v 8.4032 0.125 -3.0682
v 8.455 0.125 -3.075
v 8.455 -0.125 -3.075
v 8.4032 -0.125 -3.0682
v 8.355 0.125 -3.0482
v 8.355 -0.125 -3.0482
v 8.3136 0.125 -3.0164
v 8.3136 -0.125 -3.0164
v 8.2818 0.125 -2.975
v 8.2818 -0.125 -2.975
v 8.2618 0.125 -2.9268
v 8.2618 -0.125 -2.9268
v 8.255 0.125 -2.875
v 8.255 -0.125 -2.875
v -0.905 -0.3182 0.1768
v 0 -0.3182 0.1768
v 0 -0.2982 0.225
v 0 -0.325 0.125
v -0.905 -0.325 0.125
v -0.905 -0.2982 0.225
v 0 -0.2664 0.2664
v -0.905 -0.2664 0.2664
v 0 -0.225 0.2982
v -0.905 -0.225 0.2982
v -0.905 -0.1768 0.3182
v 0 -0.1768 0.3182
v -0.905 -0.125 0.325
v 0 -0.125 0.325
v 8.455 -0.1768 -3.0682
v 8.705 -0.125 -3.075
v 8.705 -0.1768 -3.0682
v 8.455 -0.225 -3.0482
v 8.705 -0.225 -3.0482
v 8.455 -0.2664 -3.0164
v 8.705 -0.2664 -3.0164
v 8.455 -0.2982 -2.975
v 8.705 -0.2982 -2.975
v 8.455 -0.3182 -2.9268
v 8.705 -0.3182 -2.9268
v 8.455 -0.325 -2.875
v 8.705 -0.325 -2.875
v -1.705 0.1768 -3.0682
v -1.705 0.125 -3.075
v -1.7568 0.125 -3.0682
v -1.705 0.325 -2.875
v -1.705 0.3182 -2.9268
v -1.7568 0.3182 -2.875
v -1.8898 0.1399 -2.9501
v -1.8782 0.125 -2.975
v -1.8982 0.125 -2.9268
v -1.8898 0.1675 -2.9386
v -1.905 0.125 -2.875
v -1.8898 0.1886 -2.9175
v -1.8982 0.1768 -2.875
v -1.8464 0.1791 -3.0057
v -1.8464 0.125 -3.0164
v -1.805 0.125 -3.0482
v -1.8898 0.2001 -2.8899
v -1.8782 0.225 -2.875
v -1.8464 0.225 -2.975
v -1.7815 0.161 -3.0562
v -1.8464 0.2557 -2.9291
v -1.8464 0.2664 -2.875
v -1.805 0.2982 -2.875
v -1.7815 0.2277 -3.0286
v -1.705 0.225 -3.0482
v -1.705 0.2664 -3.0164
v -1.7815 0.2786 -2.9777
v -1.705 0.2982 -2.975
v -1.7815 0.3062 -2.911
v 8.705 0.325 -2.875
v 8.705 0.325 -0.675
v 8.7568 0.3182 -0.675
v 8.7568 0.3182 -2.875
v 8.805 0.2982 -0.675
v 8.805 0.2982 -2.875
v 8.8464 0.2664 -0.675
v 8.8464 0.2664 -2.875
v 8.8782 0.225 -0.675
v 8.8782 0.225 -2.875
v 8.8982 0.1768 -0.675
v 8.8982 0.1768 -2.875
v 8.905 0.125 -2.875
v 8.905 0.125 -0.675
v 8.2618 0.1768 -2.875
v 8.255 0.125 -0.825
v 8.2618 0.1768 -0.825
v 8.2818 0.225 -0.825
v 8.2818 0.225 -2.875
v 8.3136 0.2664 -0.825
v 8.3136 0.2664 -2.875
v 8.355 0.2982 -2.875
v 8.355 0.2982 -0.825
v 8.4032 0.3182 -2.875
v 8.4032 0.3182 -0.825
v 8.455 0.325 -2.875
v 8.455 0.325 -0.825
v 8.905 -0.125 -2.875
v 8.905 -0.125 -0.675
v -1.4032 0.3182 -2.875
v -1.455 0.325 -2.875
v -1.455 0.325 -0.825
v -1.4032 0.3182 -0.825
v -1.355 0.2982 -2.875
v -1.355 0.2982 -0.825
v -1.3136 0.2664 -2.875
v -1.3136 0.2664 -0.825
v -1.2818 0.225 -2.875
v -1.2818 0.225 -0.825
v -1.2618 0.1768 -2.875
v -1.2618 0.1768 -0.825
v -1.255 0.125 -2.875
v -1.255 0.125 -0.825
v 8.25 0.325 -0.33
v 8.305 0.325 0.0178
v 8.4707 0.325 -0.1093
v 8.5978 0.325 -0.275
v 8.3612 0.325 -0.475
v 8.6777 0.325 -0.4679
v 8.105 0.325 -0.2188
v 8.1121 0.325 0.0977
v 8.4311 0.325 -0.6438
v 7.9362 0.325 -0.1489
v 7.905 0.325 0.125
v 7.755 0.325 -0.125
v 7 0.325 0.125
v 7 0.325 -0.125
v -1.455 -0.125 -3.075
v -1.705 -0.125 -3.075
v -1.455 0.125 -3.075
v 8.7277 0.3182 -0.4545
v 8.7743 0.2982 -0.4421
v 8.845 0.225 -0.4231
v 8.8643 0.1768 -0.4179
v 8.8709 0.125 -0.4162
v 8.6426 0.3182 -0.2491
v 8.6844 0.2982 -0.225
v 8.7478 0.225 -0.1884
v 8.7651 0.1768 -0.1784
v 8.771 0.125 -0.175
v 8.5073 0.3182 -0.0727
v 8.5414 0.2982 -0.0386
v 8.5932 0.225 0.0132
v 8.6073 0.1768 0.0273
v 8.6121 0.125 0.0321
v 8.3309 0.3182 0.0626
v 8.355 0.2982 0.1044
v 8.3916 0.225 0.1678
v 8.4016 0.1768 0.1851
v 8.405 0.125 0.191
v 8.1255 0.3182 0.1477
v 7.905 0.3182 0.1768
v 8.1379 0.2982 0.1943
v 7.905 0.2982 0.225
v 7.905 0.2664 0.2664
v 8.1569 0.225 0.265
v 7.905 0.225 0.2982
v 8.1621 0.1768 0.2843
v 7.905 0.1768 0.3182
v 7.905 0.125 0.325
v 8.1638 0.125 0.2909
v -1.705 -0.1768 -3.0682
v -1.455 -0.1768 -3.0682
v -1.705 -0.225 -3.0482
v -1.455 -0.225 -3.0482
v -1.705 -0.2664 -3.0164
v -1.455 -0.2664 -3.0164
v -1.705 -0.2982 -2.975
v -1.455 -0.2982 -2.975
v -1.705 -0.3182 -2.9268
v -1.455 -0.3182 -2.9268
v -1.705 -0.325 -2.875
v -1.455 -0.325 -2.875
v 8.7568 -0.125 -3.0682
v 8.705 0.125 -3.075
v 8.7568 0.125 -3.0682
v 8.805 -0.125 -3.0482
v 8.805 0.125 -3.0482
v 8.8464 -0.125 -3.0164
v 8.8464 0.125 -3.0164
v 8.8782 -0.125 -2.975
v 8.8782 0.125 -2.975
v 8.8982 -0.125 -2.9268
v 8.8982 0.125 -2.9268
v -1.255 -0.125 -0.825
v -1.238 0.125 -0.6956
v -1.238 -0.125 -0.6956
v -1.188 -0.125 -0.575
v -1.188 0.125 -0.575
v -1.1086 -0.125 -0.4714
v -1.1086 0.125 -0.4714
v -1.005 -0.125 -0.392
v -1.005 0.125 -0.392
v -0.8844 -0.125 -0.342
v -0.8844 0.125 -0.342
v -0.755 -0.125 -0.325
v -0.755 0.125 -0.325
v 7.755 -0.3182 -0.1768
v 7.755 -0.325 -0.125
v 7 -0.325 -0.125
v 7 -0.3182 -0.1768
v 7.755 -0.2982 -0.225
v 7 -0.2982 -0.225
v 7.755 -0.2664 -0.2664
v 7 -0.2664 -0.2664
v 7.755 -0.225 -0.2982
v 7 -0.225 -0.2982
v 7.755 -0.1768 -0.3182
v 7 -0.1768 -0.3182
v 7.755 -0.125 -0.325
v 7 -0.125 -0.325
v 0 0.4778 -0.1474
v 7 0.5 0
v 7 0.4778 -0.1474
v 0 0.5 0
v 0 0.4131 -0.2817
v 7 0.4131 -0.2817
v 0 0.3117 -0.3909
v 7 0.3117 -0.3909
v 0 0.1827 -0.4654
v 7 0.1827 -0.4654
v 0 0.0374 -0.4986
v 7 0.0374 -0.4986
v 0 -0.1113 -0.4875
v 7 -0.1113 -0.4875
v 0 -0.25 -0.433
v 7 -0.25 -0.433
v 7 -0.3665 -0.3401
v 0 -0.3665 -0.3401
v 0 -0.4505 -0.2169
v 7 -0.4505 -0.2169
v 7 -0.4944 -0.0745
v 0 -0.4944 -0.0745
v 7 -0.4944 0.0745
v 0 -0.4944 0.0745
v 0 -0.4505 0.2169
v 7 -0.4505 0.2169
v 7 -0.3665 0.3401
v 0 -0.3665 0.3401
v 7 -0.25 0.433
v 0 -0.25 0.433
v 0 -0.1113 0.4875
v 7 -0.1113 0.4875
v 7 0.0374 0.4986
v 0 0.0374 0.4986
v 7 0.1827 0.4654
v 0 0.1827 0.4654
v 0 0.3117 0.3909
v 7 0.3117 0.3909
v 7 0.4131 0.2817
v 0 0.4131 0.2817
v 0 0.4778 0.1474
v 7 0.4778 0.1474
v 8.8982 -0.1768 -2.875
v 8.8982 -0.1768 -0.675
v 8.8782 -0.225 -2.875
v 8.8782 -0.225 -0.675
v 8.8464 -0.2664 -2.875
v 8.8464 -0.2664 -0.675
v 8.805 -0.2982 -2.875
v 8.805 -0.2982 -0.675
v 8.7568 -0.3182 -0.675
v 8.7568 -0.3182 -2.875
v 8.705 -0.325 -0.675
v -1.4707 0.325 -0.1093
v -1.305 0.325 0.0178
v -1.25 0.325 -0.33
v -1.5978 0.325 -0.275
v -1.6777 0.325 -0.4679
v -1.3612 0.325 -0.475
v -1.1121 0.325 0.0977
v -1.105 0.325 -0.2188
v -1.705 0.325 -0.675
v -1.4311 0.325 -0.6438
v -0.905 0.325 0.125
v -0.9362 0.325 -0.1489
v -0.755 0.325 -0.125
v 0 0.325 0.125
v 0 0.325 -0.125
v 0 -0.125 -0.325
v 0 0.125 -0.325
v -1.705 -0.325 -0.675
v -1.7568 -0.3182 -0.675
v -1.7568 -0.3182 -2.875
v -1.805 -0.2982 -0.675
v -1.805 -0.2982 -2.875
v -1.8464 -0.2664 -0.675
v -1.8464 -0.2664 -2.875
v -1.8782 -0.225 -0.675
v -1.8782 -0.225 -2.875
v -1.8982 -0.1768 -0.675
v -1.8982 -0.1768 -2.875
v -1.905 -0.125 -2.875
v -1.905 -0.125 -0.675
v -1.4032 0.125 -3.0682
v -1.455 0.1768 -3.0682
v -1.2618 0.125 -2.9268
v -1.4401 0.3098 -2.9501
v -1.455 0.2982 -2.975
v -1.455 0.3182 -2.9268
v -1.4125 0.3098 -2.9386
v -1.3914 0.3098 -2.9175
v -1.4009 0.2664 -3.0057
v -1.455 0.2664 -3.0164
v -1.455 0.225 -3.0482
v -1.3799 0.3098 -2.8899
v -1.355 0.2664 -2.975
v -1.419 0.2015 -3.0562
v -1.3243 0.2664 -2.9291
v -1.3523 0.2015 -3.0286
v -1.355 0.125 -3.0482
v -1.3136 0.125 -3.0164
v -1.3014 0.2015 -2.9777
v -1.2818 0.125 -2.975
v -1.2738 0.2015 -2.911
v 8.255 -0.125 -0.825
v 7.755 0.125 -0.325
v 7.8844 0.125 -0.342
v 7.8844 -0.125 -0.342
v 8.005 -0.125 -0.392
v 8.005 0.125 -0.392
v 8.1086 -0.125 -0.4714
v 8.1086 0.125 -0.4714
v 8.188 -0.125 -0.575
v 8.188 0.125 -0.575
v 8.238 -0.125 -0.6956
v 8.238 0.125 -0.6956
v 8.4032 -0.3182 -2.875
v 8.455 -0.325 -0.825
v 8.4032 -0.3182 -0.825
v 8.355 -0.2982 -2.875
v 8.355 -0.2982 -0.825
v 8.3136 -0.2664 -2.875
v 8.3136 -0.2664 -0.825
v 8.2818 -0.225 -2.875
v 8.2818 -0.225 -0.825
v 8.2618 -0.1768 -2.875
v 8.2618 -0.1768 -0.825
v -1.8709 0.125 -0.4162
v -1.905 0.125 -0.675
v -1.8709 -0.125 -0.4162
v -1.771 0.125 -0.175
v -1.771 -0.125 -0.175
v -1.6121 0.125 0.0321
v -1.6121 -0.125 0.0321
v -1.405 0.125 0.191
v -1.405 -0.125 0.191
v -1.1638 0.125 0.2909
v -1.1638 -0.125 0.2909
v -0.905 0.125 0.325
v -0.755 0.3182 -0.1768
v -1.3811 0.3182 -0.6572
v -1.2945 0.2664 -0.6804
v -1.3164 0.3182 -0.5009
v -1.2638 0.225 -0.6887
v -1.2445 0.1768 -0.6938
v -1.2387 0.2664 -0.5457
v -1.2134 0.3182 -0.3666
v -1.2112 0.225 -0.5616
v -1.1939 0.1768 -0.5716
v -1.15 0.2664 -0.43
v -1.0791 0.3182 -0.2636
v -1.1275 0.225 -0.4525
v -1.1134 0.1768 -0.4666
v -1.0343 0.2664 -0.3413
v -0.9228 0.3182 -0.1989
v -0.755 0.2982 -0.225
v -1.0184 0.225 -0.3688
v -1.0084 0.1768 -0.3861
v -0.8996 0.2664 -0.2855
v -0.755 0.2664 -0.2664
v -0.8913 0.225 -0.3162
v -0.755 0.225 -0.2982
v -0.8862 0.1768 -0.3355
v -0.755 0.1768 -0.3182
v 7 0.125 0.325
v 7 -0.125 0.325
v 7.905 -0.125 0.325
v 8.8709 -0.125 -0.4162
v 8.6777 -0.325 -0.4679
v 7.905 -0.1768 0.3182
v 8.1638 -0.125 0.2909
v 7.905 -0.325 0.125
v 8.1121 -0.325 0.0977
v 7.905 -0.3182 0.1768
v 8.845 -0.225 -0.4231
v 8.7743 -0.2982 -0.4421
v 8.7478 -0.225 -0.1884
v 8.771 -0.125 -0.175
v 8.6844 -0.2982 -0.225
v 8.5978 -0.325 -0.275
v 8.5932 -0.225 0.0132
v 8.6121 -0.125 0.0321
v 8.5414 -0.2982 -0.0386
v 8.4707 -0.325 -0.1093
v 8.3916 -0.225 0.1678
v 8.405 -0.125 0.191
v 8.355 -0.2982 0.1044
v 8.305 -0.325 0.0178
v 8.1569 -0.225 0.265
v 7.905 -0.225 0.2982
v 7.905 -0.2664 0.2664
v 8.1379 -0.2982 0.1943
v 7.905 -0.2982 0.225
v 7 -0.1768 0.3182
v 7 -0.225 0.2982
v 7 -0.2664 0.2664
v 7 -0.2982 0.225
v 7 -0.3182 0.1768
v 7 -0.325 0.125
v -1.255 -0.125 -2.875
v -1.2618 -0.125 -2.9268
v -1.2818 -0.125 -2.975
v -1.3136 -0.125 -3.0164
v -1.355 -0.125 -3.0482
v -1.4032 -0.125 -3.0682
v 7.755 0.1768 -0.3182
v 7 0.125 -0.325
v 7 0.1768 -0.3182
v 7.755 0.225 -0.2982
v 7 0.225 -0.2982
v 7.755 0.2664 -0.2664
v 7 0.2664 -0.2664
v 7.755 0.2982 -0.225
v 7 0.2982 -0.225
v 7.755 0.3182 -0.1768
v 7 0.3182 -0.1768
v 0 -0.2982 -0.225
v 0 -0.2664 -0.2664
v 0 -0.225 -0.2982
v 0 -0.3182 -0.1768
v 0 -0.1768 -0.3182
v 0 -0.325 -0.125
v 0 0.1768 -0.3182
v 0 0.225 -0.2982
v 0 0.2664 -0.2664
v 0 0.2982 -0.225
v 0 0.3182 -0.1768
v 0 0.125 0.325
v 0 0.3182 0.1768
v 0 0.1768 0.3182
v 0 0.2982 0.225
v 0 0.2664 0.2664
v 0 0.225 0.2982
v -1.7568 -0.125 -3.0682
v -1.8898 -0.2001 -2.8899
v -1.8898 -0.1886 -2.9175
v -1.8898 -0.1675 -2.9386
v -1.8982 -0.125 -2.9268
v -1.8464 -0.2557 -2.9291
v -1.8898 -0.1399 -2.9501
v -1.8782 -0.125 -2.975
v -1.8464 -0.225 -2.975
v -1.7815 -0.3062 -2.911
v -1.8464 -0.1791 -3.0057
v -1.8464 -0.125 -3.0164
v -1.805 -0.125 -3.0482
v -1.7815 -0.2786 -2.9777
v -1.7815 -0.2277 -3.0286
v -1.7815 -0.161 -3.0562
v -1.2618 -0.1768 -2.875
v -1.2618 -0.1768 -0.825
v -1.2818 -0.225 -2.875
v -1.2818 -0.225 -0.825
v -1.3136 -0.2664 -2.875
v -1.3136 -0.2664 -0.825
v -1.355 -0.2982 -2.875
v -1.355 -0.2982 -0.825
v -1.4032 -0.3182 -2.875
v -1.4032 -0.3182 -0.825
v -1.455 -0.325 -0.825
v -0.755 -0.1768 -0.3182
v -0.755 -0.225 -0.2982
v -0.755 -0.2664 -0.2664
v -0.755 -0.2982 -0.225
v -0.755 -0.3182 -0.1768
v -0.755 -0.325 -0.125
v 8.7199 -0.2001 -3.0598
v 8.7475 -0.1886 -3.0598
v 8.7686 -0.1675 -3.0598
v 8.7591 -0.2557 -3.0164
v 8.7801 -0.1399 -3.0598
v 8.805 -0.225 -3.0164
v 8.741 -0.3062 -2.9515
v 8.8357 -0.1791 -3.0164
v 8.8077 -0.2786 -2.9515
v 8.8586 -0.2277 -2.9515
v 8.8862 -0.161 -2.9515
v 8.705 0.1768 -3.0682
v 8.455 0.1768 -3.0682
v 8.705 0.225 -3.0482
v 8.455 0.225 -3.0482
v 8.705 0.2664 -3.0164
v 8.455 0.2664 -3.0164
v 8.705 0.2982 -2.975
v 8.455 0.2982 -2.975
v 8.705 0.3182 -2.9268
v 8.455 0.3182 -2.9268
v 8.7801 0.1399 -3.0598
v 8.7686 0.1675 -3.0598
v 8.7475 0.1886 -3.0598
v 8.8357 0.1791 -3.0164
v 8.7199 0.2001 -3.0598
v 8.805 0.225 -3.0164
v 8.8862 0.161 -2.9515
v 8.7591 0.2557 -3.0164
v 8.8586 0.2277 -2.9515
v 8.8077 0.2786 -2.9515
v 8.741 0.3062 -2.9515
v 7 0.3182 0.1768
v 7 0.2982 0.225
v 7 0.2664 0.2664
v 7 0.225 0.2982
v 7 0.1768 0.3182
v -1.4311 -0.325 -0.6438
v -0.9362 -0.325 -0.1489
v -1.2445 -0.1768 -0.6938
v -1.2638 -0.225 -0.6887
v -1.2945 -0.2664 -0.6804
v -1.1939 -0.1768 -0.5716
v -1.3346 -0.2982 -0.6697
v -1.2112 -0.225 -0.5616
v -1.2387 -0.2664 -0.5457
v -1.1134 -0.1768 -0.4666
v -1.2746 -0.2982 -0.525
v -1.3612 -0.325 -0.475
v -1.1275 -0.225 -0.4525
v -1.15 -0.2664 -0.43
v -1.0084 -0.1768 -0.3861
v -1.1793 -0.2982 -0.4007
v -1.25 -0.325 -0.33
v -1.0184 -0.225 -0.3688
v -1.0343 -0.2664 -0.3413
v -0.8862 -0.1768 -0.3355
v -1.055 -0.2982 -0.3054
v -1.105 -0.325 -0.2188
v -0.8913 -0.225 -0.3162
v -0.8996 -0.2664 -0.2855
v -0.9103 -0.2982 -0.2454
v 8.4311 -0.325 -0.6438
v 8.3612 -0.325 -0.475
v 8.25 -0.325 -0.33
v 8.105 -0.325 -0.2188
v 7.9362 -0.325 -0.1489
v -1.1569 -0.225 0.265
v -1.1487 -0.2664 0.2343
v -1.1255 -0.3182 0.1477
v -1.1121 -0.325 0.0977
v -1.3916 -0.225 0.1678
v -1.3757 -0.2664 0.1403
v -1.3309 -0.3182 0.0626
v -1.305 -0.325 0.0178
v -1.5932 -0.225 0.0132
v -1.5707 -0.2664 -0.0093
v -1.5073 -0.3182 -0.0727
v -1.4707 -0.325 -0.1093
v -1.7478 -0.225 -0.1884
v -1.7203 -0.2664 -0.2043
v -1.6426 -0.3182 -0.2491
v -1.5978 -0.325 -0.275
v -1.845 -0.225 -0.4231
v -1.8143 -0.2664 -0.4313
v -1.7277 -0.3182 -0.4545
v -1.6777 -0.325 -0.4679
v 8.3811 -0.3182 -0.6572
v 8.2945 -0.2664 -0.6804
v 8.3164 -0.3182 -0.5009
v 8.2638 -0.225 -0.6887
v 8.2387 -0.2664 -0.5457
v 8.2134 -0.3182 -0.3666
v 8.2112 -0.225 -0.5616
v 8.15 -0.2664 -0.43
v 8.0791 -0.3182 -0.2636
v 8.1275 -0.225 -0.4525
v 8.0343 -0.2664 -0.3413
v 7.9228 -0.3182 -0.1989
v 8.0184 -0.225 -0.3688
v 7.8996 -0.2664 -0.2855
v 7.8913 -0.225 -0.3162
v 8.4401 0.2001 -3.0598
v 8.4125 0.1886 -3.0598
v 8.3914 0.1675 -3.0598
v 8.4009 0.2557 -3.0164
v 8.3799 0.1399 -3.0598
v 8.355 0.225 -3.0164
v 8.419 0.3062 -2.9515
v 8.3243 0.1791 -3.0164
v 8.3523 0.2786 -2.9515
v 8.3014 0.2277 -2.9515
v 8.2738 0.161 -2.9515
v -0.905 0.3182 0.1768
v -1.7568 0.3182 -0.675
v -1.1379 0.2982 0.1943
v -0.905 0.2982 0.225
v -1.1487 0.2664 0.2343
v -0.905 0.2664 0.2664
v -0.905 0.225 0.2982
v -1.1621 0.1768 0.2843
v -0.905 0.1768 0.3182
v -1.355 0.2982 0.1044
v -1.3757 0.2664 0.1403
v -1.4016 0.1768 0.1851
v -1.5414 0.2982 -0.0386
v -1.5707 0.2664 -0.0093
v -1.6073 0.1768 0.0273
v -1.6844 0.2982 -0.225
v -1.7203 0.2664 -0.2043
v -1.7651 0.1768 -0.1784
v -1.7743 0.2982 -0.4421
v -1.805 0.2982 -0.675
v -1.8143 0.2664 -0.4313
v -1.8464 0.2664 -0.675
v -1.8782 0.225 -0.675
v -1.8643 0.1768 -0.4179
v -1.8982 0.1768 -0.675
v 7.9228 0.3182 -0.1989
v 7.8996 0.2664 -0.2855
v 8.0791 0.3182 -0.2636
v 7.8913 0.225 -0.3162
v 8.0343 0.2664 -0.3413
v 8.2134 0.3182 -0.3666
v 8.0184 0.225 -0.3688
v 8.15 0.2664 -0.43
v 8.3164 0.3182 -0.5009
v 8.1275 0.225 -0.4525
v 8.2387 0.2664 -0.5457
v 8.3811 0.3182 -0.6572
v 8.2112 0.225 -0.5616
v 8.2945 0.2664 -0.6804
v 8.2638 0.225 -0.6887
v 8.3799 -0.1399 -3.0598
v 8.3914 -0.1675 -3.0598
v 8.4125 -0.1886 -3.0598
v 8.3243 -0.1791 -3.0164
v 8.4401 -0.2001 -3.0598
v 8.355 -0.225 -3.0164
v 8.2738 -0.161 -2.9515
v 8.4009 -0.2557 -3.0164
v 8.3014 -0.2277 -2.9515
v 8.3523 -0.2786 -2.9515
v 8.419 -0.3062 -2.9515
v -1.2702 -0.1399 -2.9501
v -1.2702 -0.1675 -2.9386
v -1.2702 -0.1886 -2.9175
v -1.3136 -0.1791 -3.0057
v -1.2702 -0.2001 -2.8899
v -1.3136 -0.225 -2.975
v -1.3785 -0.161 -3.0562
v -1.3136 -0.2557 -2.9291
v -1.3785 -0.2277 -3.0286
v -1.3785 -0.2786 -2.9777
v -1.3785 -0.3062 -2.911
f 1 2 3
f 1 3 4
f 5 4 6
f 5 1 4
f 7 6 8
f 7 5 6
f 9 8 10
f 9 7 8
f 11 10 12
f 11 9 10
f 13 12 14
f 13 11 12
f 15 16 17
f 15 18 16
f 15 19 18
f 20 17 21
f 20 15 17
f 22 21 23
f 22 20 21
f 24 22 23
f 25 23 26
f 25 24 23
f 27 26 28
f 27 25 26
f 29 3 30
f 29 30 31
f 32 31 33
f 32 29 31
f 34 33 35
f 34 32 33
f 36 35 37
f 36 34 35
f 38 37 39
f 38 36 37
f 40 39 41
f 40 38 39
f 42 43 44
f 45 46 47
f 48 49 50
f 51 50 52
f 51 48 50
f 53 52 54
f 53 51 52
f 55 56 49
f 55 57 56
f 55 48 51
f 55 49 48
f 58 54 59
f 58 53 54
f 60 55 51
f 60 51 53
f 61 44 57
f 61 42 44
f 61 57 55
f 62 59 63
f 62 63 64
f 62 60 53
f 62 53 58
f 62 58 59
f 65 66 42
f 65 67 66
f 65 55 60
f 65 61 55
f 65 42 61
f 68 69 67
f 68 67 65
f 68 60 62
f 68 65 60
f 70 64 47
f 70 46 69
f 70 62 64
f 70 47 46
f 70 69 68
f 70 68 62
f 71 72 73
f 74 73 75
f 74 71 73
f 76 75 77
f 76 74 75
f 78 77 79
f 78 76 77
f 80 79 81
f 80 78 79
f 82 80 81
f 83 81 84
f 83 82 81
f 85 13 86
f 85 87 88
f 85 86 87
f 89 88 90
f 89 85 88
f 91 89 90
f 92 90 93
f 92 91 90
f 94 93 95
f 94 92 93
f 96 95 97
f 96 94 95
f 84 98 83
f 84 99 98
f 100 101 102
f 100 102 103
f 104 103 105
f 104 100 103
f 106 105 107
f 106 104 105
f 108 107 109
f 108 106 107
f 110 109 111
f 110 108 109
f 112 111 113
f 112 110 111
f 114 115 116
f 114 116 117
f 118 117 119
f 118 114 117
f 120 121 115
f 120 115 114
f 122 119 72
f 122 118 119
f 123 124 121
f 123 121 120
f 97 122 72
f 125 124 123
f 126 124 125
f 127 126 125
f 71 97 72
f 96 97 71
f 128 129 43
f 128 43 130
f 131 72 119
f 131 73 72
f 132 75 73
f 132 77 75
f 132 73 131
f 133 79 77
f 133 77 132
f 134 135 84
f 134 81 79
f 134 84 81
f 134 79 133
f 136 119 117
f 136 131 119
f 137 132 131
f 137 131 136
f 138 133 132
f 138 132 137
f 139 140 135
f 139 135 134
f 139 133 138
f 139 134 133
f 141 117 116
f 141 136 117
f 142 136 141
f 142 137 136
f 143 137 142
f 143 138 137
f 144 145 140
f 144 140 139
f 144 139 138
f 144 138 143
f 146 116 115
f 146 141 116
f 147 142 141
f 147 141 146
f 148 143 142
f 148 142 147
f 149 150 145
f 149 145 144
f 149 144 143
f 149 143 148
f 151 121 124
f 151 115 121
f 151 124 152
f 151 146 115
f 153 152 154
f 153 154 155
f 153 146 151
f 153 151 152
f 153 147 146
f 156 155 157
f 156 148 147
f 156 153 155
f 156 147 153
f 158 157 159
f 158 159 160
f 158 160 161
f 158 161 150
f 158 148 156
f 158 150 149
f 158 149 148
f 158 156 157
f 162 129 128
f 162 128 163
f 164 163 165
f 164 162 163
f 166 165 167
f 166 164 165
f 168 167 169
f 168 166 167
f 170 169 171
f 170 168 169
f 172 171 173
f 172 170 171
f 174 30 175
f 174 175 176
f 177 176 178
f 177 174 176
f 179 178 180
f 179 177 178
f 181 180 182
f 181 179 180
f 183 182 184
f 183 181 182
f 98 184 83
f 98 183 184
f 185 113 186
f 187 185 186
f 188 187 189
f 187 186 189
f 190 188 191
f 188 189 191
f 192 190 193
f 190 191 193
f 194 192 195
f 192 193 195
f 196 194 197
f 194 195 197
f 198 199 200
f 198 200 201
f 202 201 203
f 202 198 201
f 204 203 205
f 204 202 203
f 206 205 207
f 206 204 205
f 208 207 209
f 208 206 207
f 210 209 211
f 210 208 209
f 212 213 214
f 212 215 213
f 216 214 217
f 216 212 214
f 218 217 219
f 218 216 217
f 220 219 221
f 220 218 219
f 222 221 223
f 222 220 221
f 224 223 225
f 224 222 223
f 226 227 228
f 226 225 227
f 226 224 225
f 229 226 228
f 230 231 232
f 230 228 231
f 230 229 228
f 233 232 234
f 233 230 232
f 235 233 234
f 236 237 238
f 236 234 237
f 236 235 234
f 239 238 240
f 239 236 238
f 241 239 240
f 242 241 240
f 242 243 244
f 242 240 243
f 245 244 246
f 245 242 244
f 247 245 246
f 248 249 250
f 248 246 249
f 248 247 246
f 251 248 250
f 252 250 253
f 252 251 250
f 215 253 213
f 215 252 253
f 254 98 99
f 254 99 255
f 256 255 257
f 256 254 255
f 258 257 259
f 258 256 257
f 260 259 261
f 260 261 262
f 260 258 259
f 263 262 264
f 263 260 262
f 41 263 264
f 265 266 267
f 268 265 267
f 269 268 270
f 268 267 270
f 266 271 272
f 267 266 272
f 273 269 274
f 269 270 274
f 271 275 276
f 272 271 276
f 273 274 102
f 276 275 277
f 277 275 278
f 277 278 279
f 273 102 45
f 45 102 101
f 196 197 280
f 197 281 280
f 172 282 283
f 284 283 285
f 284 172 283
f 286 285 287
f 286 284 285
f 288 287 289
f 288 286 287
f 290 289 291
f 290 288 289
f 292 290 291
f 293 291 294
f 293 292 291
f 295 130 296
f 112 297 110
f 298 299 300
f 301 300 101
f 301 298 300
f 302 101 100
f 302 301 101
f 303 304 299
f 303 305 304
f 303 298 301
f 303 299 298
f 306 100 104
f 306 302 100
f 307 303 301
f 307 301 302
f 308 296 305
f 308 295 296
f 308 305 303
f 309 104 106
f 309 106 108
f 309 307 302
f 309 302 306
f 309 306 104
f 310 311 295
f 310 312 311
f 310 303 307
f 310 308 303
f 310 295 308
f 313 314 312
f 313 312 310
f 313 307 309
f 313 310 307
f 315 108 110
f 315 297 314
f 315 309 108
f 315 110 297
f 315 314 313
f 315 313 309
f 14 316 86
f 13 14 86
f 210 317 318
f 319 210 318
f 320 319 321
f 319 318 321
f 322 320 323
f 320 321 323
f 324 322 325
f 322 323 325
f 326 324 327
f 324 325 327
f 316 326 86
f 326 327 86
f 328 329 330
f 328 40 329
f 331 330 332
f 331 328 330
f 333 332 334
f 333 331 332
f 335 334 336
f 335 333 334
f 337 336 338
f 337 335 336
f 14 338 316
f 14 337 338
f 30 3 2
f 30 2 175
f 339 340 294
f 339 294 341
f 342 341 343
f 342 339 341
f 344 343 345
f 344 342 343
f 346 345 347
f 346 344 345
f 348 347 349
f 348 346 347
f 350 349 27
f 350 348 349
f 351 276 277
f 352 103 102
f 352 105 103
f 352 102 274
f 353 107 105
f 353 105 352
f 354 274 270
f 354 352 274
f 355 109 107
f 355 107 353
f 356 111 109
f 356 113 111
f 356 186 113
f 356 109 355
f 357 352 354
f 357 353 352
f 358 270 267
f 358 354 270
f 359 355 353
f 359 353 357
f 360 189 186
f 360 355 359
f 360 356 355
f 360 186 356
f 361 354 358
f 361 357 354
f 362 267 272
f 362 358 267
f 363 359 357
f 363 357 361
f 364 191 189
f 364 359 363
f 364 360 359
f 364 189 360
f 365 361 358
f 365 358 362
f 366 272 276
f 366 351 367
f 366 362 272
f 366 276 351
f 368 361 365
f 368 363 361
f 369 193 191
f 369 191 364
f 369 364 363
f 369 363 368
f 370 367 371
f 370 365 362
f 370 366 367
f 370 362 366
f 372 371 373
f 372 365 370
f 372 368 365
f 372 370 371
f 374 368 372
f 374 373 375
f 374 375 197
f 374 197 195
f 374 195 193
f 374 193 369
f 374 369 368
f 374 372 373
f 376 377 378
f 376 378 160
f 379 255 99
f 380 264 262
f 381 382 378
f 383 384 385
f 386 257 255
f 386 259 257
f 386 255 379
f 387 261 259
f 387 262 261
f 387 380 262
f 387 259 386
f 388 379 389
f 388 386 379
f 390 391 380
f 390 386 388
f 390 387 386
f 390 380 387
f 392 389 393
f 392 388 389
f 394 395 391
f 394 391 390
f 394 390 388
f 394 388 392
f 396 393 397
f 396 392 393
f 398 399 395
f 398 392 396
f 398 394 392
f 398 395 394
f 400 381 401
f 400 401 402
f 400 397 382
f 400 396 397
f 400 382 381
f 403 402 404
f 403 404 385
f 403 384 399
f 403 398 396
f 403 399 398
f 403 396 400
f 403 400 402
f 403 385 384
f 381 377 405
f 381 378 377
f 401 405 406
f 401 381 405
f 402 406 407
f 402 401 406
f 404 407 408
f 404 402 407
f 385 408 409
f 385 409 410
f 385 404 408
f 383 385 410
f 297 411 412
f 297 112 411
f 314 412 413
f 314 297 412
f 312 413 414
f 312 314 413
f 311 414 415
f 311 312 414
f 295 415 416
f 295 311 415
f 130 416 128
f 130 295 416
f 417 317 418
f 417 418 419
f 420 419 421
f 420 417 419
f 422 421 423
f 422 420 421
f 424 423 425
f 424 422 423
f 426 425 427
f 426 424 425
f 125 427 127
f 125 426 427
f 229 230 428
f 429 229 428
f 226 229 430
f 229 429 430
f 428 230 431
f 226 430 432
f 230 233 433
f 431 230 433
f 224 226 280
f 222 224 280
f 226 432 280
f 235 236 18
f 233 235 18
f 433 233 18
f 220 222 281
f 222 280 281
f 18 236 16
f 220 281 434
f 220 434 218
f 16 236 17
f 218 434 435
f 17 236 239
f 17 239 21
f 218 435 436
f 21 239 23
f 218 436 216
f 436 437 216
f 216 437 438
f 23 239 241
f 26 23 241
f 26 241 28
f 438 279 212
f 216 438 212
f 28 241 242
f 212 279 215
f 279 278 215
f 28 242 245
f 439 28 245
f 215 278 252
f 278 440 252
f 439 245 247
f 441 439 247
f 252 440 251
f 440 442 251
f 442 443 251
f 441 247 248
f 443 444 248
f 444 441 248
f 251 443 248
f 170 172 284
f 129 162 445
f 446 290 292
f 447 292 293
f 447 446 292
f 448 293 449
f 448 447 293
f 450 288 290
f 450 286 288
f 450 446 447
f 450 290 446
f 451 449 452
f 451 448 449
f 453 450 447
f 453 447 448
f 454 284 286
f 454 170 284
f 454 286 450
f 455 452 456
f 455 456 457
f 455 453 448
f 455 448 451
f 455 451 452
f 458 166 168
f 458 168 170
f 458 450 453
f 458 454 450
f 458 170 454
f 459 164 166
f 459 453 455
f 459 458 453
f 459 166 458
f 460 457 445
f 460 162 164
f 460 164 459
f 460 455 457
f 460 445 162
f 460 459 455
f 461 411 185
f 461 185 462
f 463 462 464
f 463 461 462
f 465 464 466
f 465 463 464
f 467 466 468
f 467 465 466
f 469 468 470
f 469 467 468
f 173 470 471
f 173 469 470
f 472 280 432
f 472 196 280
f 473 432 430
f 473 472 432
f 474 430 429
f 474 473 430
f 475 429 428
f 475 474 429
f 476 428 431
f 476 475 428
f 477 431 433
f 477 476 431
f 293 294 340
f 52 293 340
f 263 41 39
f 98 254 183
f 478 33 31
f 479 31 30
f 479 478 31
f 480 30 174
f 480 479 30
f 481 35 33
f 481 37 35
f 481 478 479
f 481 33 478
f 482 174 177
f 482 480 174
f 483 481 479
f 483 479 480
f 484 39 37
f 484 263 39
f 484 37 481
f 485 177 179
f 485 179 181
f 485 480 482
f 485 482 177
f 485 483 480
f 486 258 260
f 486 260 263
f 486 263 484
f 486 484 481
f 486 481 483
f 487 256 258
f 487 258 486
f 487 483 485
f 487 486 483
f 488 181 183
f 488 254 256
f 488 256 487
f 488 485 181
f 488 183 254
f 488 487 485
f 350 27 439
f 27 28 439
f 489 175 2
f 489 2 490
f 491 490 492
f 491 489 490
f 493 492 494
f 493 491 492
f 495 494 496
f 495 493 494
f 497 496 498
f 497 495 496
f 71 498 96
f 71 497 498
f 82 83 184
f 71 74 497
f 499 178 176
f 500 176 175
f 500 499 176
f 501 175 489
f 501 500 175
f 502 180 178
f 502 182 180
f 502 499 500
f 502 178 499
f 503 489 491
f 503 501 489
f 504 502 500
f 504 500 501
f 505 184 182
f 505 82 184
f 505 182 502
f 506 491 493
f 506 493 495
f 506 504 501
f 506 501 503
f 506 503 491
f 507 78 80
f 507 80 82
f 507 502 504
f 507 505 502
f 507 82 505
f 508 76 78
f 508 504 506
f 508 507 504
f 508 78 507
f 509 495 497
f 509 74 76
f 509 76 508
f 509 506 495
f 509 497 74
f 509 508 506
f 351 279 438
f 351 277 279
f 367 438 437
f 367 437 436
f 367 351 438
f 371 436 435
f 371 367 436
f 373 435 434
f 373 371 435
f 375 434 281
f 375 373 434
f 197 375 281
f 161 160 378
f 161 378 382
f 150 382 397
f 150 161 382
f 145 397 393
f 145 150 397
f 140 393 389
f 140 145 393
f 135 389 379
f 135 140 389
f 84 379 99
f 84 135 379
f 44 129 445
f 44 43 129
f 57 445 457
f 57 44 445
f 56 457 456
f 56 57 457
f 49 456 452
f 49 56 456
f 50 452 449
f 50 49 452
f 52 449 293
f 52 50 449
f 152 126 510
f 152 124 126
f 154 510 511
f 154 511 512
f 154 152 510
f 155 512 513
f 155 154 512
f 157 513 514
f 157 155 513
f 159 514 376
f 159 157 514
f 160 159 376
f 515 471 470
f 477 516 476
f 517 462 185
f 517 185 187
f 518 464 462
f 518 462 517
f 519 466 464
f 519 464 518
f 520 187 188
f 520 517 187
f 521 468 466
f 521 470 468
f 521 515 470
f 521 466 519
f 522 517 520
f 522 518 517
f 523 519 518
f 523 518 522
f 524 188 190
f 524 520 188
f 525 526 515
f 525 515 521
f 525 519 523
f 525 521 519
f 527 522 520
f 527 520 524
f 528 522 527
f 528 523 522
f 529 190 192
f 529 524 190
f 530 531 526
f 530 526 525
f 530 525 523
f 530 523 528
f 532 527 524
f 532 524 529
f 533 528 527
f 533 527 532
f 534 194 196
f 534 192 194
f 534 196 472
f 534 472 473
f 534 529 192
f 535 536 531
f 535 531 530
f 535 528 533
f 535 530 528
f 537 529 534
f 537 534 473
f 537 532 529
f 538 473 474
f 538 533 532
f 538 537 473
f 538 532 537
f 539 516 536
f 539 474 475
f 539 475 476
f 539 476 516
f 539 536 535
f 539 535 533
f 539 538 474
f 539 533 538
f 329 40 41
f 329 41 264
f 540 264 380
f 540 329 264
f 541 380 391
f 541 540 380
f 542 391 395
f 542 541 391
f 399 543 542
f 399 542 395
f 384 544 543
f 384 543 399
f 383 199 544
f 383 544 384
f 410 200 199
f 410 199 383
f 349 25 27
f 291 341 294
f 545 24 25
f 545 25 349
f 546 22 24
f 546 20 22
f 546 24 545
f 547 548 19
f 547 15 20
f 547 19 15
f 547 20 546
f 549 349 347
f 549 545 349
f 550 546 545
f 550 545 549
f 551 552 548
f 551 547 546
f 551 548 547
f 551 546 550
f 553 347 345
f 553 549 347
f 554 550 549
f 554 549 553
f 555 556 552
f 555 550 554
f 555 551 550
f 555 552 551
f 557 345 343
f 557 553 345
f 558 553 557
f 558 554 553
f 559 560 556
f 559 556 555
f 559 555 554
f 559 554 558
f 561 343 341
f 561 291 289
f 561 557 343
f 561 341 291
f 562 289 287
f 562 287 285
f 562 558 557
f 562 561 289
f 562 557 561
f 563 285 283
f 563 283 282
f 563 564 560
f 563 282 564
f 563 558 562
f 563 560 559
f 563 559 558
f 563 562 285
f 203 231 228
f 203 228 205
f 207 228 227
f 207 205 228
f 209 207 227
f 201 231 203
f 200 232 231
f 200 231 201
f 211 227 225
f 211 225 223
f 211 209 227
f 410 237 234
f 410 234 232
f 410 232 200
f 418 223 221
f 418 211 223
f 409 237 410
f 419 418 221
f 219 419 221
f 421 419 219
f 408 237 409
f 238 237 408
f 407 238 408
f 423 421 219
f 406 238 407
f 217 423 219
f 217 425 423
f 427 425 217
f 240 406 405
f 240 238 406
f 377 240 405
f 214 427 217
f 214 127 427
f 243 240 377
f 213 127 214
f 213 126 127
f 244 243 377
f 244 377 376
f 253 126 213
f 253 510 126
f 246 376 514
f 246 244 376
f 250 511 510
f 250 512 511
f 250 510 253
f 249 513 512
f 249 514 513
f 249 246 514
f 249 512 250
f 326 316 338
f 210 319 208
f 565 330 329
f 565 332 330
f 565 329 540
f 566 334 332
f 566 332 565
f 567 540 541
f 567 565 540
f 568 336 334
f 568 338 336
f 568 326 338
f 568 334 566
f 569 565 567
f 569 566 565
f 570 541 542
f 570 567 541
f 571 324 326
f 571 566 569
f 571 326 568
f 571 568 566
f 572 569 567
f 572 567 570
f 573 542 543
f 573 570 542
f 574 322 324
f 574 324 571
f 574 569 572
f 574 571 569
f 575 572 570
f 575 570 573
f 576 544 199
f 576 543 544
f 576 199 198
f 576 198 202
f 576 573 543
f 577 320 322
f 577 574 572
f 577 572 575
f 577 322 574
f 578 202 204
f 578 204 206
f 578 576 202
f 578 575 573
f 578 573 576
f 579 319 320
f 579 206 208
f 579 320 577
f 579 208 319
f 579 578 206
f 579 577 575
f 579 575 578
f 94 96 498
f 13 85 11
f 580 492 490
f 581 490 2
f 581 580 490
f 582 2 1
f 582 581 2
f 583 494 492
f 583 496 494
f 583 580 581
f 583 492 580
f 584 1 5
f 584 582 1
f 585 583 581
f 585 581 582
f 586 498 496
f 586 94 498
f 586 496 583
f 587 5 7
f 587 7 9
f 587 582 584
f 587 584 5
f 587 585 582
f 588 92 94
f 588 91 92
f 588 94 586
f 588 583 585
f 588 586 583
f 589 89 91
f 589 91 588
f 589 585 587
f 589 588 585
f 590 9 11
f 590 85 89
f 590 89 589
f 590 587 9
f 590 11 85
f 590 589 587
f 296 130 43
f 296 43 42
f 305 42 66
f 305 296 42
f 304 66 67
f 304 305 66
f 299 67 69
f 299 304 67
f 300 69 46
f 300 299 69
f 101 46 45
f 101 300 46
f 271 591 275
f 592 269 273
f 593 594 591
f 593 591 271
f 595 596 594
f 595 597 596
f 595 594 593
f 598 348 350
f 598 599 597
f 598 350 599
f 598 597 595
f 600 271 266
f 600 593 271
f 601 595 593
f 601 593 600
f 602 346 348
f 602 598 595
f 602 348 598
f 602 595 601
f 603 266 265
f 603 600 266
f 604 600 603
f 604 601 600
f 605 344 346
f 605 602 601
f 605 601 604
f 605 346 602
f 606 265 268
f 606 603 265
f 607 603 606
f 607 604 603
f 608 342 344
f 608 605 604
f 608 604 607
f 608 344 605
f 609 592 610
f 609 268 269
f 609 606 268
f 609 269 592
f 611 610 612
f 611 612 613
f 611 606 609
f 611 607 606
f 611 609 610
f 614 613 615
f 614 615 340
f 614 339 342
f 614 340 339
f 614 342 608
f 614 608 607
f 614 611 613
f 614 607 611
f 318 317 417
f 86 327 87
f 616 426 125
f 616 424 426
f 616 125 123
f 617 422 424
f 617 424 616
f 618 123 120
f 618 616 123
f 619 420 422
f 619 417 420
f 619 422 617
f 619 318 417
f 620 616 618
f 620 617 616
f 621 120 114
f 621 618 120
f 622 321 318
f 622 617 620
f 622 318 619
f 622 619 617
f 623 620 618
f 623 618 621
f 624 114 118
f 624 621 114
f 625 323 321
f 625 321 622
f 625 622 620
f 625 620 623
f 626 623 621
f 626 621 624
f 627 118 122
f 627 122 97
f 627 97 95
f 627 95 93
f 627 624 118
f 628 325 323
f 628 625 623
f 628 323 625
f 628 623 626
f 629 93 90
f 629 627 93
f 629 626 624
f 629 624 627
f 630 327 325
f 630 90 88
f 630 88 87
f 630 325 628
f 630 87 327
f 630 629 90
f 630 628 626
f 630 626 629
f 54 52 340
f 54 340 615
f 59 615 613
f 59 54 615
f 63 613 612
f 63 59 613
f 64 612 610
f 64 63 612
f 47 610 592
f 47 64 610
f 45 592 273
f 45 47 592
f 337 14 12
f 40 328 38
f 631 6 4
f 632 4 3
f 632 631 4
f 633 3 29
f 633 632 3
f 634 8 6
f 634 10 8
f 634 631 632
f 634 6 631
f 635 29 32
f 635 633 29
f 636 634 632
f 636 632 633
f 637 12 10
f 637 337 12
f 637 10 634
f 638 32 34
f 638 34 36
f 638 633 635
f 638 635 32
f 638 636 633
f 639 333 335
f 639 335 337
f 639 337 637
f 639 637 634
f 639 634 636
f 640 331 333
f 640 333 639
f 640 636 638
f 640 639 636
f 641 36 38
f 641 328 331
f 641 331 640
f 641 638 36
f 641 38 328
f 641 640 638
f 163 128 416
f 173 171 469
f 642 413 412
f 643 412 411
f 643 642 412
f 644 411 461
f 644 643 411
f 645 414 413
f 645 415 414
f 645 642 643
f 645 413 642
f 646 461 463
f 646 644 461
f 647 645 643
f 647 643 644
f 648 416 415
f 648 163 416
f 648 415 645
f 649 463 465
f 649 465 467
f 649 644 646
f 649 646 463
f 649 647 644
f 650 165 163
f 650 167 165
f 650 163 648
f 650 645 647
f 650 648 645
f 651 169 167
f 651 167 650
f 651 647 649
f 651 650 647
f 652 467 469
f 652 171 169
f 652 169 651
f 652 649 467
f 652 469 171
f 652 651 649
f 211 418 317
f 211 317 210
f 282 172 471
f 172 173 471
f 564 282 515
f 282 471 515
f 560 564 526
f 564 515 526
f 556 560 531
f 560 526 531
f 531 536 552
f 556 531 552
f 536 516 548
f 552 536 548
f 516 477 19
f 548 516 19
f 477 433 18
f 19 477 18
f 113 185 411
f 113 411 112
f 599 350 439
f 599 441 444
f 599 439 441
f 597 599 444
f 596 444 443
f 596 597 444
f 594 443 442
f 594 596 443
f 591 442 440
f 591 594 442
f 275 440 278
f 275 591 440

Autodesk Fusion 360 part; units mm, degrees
sketch "Sketch1" plane through (0, 0, 0) normal (1, 0, 0) x (0, 1, 0)
  circle A0 centre (0, 0) radius 0.5
  line L0 (0.325, -0.325) -> (-0.325, -0.325)
  line L1 (-0.325, -0.325) -> (-0.325, 0.325)
  line L2 (-0.325, 0.325) -> (0.325, 0.325)
  line L3 (0.325, 0.325) -> (0.325, -0.325)
  line L4 (0.325, -0.325) -> (-0.325, 0.325) construction
  line L5 (-0.325, -0.325) -> (0.325, 0.325) construction
  dimension "d1" = 1
  dimension "d2" = 0.65
  dimension "d3" = 0.65
extrude "Extrude1" add sketch "Sketch1" along normal blind 7 contours A0 | L0 L1 L2 L3
sketch "Sketch2" plane through (7, 0, 0) normal (1, 0, 0) x (0, 1, 0)
  circle A0 centre (0, 0) radius 0.5
  line L0 (0.325, -0.325) -> (-0.325, -0.325)
  line L1 (-0.325, -0.325) -> (-0.325, 0.325)
  line L2 (-0.325, 0.325) -> (0.325, 0.325)
  line L3 (0.325, 0.325) -> (0.325, -0.325)
  line L4 (0.325, -0.325) -> (-0.325, 0.325) construction
  line L5 (-0.325, -0.325) -> (0.325, 0.325) construction
  dimension "d8" = 0.65
  dimension "d9" = 0.65
extrude "Extrude2" add sketch "Sketch2" along normal blind 1.905 contours L0 L1 L2 L3
extrude "Extrude3" add sketch "Sketch1" against normal blind 1.905 contours L0 L1 L2 L3
sketch "Sketch3" plane through (0, 0, -0.325) normal (0, 0, -1) x (1, 0, 0)
  line L0 (7, 0.325) -> (7, -0.325)
  line L1 (7, -0.325) -> (8.905, -0.325)
  line L2 (8.905, -0.325) -> (8.905, 0.325)
  line L3 (8.905, 0.325) -> (7, 0.325)
  line L4 (8.905, 0.325) -> (8.255, 0.325)
  line L5 (8.255, 0.325) -> (8.255, -0.325)
  line L6 (8.255, -0.325) -> (8.905, -0.325)
  line L7 (8.905, -0.325) -> (8.905, 0.325)
  line L8 (8.905, 0.325) -> (8.255, -0.325) construction
  line L9 (8.255, 0.325) -> (8.905, -0.325) construction
  point P0 (8.58, 0)
  dimension "d14" = 0.65
  dimension "d15" = 0.65
sketch "Sketch4" plane through (0, 0, -0.325) normal (0, 0, -1) x (1, 0, 0)
  line L0 (0, -0.325) -> (0, 0.325)
  line L1 (0, 0.325) -> (-1.905, 0.325)
  line L2 (-1.905, 0.325) -> (-1.905, -0.325)
  line L3 (-1.905, -0.325) -> (0, -0.325)
  line L4 (-1.255, -0.325) -> (-1.905, -0.325)
  line L5 (-1.905, -0.325) -> (-1.905, 0.325)
  line L6 (-1.905, 0.325) -> (-1.255, 0.325)
  line L7 (-1.255, 0.325) -> (-1.255, -0.325)
  line L8 (-1.255, -0.325) -> (-1.905, 0.325) construction
  line L9 (-1.905, -0.325) -> (-1.255, 0.325) construction
  point P0 (-1.58, 0)
  dimension "d17" = 0.65
  dimension "d18" = 0.65
extrude "Extrude4" add sketch "Sketch4" sketch "Sketch3" along normal blind 2.75 contours L1 L2 L3 L4 L5 L6 L7 of sketch 2 contours L1 L2 L3 L4 L5 L6 L7
fillet "Fillet1" radius 0.5 2 edges at (-1.255, 0, -0.325) (8.255, 0, -0.325)
fillet "Fillet2" radius 1 2 edges at (-1.905, 0, 0.325) (8.905, 0, 0.325)
fillet "Fillet3" radius 0.2 32 edges at (-1.58, -0.325, -3.075) (-1.255, 0, -3.075) (-1.58, 0.325, -3.075) (-1.905, 0, -3.075) (-1.1086, -0.325, -0.4714) (-1.255, -0.325, -1.95) (-0.3775, -0.325, -0.325) (-0.4525, -0.325, 0.325) (-1.6121, -0.325, 0.0321) (-1.905, -0.325, -1.875) (-0.4525, 0.325, 0.325) (-1.6121, 0.325, 0.0321) (-1.905, 0.325, -1.875) (-1.1086, 0.325, -0.4714) (-0.3775, 0.325, -0.325) (-1.255, 0.325, -1.95) (7.4525, -0.325, 0.325) (8.6121, -0.325, 0.0321) (8.905, -0.325, -1.875) (8.255, -0.325, -1.95) (8.1086, -0.325, -0.4714) (7.3775, -0.325, -0.325) (8.905, 0.325, -1.875) (8.6121, 0.325, 0.0321) (7.4525, 0.325, 0.325) (8.1086, 0.325, -0.4714) (8.255, 0.325, -1.95) (7.3775, 0.325, -0.325) (8.58, 0.325, -3.075) (8.905, 0, -3.075) (8.58, -0.325, -3.075) (8.255, 0, -3.075)
equation "d1 = width"
equation "d2 = d3"
equation "d3 = d1 * 0.65"
equation "width = 1 mm"
equation "baseLenght = 7 mm"
equation "d6 = baseLenght"
equation "d8 = width * 0.65"
equation "d9 = d8"
equation "d10 = ( ( 2.54 * ceil(( baseLenght + 1.3 * width ) / 2.54 mm) ) * 1 mm + 0.65 * width - baseLenght ) / 2"
equation "d12 = -( ( 2.54 * ceil(( baseLenght + 1.3 * width ) / 2.54 mm) ) * 1 mm + 0.65 * width - baseLenght ) / 2"
equation "d14 = width * 0.65"
equation "d15 = d14"
equation "d17 = width * 0.65"
equation "d18 = d17"
equation "d26 = 0.2 * width"
